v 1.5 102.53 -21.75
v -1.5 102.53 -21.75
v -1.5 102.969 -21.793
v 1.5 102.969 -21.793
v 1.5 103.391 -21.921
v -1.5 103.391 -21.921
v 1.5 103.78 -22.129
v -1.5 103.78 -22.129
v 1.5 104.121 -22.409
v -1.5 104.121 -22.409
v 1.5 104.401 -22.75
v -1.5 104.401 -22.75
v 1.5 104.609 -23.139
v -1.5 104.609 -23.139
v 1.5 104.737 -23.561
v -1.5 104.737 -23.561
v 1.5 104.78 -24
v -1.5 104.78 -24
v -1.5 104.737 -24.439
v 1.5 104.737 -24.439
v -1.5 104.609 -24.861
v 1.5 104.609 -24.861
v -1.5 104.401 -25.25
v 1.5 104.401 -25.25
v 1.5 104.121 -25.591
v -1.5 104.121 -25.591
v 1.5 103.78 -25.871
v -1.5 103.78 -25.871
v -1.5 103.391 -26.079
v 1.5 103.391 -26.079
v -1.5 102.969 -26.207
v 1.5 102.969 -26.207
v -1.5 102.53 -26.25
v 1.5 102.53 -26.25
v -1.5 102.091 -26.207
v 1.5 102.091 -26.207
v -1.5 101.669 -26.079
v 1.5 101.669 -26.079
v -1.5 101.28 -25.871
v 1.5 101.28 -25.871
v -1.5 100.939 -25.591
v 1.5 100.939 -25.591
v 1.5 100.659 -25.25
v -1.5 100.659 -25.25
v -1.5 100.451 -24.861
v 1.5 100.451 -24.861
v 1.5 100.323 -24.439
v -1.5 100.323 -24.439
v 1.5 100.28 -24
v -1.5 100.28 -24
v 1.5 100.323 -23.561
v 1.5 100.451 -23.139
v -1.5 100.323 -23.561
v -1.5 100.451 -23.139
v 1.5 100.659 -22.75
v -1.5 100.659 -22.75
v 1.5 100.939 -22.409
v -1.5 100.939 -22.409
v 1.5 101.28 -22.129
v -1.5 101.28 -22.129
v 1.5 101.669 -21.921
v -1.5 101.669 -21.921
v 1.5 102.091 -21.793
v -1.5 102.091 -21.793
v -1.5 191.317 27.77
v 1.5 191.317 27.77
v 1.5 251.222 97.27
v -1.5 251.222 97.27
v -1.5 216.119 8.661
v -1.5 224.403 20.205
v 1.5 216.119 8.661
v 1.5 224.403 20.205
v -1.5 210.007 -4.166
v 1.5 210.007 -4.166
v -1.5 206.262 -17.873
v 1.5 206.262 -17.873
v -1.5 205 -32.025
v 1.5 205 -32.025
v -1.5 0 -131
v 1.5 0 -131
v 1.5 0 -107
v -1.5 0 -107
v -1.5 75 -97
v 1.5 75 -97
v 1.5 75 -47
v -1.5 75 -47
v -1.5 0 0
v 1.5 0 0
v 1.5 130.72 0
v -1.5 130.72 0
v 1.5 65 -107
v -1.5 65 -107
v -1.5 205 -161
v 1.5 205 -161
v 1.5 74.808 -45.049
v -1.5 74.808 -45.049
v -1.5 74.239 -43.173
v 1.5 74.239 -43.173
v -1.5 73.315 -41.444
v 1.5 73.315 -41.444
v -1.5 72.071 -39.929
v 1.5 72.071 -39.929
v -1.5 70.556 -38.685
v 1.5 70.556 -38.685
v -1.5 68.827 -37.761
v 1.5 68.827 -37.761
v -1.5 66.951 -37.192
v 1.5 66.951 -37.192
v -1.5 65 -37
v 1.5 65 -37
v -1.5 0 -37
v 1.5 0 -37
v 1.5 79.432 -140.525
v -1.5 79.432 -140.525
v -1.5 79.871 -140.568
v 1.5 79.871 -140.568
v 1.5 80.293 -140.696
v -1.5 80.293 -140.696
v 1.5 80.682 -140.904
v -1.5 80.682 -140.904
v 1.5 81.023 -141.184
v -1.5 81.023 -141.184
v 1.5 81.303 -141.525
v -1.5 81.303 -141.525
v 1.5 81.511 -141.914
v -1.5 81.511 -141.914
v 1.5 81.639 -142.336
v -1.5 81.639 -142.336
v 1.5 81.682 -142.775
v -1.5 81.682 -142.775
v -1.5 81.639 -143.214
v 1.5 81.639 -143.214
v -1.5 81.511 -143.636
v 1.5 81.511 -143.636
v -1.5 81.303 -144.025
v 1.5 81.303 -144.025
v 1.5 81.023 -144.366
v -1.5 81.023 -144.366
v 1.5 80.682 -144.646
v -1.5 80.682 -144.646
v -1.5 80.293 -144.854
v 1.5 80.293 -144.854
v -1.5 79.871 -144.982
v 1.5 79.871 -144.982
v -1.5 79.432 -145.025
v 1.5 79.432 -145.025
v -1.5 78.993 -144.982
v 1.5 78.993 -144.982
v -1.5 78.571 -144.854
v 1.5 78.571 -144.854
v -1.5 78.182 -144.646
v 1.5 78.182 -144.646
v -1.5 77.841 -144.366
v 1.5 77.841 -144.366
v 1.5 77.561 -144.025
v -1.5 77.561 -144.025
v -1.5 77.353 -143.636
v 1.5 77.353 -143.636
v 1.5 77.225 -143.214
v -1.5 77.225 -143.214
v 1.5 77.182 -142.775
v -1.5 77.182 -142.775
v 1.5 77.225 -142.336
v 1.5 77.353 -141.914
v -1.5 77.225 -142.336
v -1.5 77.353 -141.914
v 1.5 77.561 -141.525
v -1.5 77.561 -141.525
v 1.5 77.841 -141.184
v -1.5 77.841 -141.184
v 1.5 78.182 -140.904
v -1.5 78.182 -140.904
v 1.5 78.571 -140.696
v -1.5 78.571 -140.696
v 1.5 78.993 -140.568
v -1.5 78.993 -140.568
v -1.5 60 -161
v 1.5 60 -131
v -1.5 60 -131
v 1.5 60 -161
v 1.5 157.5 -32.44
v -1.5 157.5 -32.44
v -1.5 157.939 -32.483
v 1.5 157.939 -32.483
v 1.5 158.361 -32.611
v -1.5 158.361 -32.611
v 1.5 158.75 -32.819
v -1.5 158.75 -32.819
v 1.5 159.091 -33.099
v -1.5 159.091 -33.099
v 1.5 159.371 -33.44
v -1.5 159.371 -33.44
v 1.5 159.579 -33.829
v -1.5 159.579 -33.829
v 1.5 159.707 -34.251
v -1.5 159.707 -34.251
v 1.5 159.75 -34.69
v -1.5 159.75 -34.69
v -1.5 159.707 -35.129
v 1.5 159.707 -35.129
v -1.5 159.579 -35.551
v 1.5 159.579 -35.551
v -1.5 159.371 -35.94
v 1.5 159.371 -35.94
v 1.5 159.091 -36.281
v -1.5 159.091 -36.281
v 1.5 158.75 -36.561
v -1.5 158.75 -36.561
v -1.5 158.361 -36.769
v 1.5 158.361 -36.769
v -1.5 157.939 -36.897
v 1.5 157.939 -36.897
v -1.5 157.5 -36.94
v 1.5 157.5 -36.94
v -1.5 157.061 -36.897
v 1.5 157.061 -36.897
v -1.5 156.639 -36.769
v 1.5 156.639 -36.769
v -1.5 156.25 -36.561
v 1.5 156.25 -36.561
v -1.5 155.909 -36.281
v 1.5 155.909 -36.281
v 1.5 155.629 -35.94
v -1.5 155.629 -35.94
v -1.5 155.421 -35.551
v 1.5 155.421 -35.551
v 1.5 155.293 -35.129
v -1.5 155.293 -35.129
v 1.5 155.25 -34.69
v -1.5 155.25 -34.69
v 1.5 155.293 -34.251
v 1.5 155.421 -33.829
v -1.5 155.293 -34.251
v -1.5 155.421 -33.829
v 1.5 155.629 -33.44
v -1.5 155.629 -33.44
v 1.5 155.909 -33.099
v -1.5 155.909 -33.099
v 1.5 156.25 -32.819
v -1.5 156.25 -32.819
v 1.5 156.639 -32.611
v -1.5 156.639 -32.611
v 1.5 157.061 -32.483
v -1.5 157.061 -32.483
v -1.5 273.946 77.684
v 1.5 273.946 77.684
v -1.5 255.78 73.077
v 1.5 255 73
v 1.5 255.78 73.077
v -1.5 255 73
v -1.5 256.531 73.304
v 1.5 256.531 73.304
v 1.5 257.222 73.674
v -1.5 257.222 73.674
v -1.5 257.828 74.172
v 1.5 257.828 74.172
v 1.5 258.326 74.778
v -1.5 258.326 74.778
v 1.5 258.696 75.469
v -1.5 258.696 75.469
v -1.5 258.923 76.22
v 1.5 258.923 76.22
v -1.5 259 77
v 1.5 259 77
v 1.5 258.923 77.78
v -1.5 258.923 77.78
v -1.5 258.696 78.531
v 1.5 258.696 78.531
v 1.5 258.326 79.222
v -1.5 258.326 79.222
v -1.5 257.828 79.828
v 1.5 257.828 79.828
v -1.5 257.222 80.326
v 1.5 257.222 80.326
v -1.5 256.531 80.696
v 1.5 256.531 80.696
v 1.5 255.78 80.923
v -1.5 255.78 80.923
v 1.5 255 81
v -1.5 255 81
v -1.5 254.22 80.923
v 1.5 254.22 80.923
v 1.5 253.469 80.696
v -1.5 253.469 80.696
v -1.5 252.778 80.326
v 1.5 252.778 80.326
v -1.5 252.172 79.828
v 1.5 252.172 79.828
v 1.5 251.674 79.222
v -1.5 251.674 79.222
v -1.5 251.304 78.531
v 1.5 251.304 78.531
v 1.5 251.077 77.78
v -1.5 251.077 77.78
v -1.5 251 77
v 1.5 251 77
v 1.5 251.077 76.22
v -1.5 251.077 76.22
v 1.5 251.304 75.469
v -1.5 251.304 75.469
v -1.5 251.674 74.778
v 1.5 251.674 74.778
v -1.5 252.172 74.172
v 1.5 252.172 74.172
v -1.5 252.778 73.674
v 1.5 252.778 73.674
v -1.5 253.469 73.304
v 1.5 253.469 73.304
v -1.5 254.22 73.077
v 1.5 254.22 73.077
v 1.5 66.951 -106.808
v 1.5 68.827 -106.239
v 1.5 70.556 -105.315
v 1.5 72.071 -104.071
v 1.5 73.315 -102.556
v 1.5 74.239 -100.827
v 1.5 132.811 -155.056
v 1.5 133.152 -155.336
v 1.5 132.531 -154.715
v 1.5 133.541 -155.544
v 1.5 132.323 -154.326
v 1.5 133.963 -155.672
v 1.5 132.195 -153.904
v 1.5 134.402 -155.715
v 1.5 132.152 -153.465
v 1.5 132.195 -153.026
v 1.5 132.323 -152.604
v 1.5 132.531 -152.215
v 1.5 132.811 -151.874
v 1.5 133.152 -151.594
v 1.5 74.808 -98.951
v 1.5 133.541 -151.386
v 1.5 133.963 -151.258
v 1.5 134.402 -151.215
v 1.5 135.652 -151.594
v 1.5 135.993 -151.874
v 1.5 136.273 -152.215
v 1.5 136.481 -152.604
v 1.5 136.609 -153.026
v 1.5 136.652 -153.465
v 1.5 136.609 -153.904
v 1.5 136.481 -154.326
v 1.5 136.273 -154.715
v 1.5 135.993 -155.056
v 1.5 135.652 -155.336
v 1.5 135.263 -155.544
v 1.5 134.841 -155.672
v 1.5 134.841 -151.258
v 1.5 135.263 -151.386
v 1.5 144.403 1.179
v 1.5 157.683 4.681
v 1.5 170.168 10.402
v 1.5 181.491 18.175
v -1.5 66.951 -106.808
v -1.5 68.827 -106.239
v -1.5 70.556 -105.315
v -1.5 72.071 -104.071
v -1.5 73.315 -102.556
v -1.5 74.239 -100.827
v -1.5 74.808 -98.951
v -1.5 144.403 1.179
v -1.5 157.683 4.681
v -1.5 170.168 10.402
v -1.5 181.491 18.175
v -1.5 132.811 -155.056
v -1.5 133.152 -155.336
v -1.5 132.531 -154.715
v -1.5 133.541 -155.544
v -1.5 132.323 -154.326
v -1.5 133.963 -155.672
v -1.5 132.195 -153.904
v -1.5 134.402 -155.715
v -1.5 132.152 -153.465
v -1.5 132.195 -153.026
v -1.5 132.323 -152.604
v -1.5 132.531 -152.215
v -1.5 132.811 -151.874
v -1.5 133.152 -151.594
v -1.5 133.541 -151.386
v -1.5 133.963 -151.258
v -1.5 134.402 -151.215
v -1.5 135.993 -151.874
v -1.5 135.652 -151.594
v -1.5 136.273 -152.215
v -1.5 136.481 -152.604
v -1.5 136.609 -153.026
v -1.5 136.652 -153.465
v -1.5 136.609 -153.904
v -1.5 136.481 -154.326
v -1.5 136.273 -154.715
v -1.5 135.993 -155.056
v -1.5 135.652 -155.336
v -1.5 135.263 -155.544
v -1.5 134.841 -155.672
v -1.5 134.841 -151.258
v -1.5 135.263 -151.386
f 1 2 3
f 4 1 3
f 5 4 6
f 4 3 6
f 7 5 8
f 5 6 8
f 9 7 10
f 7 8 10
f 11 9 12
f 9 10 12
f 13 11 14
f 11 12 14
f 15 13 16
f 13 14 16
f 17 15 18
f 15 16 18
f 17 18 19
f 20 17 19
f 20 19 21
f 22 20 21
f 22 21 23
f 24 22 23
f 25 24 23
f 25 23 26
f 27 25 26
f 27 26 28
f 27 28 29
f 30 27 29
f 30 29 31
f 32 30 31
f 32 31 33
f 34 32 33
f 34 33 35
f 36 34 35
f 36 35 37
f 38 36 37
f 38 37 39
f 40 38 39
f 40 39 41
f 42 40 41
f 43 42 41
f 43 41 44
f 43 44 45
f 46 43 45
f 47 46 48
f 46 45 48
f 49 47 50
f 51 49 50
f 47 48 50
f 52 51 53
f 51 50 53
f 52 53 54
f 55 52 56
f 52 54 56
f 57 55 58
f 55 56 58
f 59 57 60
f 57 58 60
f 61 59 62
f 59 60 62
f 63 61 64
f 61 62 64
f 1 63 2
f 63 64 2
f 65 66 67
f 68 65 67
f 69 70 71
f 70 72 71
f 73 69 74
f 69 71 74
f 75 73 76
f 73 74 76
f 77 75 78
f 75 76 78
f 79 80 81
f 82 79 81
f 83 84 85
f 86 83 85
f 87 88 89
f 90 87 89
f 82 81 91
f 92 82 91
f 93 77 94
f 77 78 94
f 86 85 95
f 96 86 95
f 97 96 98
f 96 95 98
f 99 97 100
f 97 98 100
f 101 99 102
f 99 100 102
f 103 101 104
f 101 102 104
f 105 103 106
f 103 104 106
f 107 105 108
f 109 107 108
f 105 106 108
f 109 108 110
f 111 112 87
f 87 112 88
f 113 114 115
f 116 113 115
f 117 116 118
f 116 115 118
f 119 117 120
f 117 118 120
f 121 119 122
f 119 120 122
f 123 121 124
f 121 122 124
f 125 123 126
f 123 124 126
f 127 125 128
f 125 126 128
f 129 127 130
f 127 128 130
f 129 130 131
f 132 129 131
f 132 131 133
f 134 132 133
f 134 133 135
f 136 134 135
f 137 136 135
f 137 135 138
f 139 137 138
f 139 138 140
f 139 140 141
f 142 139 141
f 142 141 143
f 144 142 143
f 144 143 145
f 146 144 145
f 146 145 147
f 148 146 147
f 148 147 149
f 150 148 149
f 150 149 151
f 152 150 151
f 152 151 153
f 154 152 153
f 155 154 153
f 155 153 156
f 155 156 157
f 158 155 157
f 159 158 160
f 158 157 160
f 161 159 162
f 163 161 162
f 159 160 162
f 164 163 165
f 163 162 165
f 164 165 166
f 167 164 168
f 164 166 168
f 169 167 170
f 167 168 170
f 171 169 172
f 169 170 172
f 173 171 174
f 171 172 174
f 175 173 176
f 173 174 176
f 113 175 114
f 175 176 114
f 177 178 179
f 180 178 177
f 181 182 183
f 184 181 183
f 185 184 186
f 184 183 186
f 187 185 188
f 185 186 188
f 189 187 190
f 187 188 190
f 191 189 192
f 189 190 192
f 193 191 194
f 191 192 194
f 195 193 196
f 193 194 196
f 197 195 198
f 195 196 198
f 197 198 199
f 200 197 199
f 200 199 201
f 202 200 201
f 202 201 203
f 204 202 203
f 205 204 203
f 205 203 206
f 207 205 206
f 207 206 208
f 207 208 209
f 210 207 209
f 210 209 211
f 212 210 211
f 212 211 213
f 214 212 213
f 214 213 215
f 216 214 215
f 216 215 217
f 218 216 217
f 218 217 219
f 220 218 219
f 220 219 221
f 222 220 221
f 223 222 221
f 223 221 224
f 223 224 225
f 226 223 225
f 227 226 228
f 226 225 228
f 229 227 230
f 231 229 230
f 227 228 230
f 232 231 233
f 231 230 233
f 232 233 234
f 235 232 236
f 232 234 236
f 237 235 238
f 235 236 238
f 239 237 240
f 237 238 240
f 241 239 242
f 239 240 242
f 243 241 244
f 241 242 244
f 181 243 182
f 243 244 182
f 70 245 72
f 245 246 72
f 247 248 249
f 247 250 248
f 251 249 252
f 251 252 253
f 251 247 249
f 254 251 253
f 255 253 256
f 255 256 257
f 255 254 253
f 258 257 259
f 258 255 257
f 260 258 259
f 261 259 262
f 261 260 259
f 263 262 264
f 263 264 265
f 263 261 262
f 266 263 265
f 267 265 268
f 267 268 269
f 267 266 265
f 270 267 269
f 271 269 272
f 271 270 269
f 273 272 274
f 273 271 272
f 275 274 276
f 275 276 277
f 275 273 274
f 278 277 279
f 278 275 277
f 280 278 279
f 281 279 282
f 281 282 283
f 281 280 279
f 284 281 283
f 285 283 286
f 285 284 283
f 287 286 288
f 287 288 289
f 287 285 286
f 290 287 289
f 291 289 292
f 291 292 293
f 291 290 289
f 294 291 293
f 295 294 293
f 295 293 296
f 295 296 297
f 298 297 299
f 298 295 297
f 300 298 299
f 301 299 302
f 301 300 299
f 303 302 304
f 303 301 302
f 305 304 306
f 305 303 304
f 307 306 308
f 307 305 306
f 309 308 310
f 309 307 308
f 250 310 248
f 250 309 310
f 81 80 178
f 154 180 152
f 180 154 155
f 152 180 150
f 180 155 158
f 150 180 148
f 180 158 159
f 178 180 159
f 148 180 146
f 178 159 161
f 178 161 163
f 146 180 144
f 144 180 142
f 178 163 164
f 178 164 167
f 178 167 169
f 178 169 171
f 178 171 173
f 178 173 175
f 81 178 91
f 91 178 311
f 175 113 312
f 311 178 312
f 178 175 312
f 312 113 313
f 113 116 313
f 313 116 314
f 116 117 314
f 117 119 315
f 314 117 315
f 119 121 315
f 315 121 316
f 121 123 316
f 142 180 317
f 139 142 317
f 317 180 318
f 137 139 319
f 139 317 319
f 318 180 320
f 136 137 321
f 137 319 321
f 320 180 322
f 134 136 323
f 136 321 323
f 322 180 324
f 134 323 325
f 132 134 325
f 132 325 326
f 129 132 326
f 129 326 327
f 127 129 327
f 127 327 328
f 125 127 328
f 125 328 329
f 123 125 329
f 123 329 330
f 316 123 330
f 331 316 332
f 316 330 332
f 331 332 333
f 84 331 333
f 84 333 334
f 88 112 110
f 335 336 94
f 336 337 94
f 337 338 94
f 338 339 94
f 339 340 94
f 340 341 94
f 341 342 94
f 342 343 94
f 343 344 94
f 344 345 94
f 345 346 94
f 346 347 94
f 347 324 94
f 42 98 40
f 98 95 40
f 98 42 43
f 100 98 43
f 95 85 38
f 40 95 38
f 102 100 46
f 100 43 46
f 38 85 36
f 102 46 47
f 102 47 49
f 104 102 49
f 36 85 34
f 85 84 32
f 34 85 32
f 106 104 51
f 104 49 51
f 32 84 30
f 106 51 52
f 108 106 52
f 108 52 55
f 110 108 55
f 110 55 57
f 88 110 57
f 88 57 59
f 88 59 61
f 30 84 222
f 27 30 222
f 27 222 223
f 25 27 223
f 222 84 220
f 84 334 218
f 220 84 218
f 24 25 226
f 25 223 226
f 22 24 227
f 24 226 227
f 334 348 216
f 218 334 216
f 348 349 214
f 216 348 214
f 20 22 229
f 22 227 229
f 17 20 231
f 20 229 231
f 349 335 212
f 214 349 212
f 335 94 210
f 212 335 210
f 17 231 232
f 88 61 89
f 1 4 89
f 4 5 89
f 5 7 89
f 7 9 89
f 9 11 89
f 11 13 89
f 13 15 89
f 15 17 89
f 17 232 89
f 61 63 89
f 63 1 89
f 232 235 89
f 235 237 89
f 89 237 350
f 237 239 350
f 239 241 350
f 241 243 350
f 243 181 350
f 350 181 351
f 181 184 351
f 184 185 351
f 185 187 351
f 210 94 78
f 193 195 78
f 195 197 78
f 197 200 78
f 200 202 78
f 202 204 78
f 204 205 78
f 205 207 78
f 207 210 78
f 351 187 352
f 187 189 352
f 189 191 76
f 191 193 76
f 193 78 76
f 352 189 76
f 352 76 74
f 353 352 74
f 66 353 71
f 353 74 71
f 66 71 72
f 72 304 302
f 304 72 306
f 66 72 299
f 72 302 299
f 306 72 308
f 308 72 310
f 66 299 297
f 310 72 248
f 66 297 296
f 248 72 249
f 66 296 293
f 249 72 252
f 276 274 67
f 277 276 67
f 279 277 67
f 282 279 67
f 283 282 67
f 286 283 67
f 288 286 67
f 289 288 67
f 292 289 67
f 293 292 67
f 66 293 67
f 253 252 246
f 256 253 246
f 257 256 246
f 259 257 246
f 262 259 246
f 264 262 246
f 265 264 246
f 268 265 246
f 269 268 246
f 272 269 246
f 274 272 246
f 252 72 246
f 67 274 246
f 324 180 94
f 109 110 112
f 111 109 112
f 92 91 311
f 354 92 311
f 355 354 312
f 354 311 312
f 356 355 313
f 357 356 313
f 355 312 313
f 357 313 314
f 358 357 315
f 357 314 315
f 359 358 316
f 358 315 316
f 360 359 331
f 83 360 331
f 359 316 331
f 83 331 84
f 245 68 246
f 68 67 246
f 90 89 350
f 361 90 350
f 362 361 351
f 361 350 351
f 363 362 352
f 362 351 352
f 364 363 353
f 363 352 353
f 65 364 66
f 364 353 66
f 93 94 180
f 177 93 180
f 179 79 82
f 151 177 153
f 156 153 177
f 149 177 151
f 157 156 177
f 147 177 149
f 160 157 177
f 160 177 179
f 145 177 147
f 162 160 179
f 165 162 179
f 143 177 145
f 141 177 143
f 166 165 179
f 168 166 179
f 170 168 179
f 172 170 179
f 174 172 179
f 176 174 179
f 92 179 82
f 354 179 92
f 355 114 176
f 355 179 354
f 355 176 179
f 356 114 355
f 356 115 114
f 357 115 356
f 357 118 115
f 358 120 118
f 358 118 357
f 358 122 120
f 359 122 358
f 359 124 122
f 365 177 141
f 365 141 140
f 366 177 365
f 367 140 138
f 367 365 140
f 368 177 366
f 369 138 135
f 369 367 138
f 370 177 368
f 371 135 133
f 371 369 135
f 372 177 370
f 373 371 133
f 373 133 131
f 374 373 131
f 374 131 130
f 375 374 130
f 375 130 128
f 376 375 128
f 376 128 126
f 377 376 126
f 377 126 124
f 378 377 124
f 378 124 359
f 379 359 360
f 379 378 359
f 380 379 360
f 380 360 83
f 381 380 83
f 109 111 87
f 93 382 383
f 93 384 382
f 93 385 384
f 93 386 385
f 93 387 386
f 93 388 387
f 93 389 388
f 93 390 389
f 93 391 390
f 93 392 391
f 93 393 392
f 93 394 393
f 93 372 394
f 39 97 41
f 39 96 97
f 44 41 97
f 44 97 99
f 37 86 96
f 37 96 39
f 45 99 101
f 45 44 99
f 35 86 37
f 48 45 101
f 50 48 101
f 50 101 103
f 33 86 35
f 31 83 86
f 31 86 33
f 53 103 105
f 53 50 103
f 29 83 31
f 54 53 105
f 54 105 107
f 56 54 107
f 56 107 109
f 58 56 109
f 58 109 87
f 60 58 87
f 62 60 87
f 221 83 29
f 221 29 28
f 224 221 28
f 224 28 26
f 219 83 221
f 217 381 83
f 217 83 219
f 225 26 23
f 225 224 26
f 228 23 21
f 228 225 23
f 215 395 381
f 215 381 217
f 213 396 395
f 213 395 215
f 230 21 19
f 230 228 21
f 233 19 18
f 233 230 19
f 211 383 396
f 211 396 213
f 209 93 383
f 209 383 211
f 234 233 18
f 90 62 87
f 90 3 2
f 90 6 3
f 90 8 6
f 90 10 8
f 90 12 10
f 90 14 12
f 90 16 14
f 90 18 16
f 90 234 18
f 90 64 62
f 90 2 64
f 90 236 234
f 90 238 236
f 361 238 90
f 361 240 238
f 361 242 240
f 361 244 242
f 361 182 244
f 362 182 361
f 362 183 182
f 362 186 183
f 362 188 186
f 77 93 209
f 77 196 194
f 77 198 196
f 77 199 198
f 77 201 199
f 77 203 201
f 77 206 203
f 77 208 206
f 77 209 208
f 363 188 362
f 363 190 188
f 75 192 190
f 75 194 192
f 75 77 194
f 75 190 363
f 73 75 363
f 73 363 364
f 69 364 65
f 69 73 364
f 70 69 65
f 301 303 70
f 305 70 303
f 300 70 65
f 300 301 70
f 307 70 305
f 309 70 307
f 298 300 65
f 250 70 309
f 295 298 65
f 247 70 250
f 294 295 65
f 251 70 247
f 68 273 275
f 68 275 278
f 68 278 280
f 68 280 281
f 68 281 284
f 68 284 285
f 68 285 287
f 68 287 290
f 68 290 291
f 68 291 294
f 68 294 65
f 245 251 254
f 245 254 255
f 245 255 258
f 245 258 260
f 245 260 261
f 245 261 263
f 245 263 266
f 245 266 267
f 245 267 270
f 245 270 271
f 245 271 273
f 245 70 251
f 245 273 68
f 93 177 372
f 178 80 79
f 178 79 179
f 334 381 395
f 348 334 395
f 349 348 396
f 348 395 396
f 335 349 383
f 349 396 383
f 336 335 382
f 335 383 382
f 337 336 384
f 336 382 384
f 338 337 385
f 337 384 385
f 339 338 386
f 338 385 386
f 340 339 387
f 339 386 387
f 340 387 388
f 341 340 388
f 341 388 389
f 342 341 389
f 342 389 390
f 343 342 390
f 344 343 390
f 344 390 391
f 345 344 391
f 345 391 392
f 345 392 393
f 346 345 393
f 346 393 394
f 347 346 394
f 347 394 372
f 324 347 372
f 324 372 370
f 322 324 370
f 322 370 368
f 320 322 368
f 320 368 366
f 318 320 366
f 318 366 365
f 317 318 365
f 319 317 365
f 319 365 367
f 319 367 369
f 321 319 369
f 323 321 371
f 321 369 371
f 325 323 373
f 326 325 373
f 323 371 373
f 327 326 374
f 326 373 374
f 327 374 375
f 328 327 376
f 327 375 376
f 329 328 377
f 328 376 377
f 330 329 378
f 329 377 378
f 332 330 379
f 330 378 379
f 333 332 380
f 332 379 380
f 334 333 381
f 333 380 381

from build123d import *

# Parameters (mm, degrees)
SKETCH_1_R             = 4
EXTRUDE_1_DEPTH        = 1.5
CUT_EXTRUDE_1_DEPTH    = 318.767533759
HOLE_WIZARD_M4_1_D     = 4.5
HOLE_WIZARD_M4_1_DEPTH = 4
HOLE_WIZARD_M4_1_TIP   = 1.351936393
SKETCH_5_W             = 30
SKETCH_5_H             = 60
CUT_EXTRUDE_2_DEPTH    = 318.767533759


with BuildPart() as part:
    # 草图1 → 凸台-拉伸1 (new, symmetric)
    with BuildSketch(Plane(origin=(0, 0, 0), x_dir=(0, 0, -1), z_dir=(1, 0, 0))):
        with BuildLine():
            Line((-27.769667841, 191.317400645), (-97.269946411, 251.221762497))
            Line((-97.269946411, 251.221762497), (-77.683571852, 273.9456251))
            Line((-77.683571852, 273.9456251), (-20.204886802, 224.403033058))
            ThreePointArc((-20.204886802, 224.403033058), (4.166491279, 210.007475855), (32.025445357, 205))
            Line((32.025445357, 205), (161, 205))
            Line((161, 205), (161, 0))
            Line((161, 0), (0, 0))
            Line((0, 0), (0, 130.720433703))
            ThreePointArc((0, 130.720433703), (-7.273022293, 164.048900719), (-27.769667841, 191.317400645))
        make_face()
        with Locations((-77, 255)):
            Circle(SKETCH_1_R, mode=Mode.SUBTRACT)
    extrude(amount=EXTRUDE_1_DEPTH, both=True)

    # 草图2 → 切除-拉伸1 (cut, through all)
    with BuildSketch(Plane(origin=(1.5, 0, 0), x_dir=(0, 0, -1), z_dir=(1, 0, 0))):
        with BuildLine():
            Line((37, 0), (107, 0))
            Line((107, 0), (107, 65))
            ThreePointArc((107, 65), (104.071067812, 72.071067812), (97, 75))
            Line((97, 75), (47, 75))
            ThreePointArc((47, 75), (39.928932188, 72.071067812), (37, 65))
            Line((37, 65), (37, 0))
        make_face()
    extrude(amount=-CUT_EXTRUDE_1_DEPTH, mode=Mode.SUBTRACT)

    # M4 间隙孔1
    with Locations(Plane(origin=(1.5, 0, 0), x_dir=(0, 0, -1), z_dir=(1, 0, 0))):
        with Locations((34.69, 157.500209205), (24, 102.53), (153.464916317, 134.40217349), (142.774916317, 79.431964286)):
            Hole(HOLE_WIZARD_M4_1_D / 2, depth=HOLE_WIZARD_M4_1_DEPTH)
            with Locations((0, 0, -(HOLE_WIZARD_M4_1_DEPTH + HOLE_WIZARD_M4_1_TIP / 2))):  # 118° drill point
                Cone(0, HOLE_WIZARD_M4_1_D / 2, HOLE_WIZARD_M4_1_TIP, mode=Mode.SUBTRACT)

    # 草图5 → 切除-拉伸2 (cut, through all)
    with BuildSketch(Plane(origin=(1.5, 0, 0), x_dir=(0, 0, -1), z_dir=(1, 0, 0))):
        with Locations((146, 30)):
            Rectangle(SKETCH_5_W, SKETCH_5_H)
    extrude(amount=-CUT_EXTRUDE_2_DEPTH, mode=Mode.SUBTRACT)


solid = part.part
